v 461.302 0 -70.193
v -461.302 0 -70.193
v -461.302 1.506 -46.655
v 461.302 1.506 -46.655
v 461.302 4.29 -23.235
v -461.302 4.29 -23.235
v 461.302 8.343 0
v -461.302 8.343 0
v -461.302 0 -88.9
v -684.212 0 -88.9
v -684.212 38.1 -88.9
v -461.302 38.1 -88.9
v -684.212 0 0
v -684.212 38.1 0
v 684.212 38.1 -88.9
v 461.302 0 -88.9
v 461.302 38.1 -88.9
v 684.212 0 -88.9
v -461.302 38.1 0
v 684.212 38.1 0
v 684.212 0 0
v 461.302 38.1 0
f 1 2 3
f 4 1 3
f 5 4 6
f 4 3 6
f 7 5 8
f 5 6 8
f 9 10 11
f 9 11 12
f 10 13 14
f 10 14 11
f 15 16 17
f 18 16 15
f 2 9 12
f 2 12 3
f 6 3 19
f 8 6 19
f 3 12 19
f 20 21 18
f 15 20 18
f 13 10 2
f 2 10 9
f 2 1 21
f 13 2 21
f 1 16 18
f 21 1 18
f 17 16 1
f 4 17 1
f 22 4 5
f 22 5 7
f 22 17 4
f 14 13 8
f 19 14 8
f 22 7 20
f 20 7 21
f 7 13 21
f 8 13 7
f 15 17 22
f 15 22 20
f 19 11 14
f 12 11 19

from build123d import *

# Parameters (mm, degrees)
SKETCH1_W           = 1368.425
SKETCH1_H           = 88.9
BOSS_EXTRUDE1_DEPTH = 38.1
CUT_EXTRUDE2_DEPTH  = 461.3021


with BuildPart() as part:
    # Sketch1 → Boss-Extrude1 (new body)
    with BuildSketch(Plane(origin=(0, 0, 0), x_dir=(1, 0, 0), z_dir=(0, 1, 0))):
        with Locations((0, 44.45)):
            Rectangle(SKETCH1_W, SKETCH1_H)
    extrude(amount=BOSS_EXTRUDE1_DEPTH)

    # Sketch3 → Cut-Extrude2 (cut, symmetric)
    with BuildSketch(Plane.ZY):
        with BuildLine():
            Line((-88.9, 0), (-70.192697288, 0))
            ThreePointArc((-70.192697288, 0), (-34.926054855, 2.738891811), (0, 8.343201677))
            Line((0, 8.343201677), (0, 38.1))
            Line((0, 38.1), (-88.9, 38.1))
            Line((-88.9, 38.1), (-88.9, 0))
        make_face()
    extrude(amount=CUT_EXTRUDE2_DEPTH, both=True, mode=Mode.SUBTRACT)


solid = part.part
